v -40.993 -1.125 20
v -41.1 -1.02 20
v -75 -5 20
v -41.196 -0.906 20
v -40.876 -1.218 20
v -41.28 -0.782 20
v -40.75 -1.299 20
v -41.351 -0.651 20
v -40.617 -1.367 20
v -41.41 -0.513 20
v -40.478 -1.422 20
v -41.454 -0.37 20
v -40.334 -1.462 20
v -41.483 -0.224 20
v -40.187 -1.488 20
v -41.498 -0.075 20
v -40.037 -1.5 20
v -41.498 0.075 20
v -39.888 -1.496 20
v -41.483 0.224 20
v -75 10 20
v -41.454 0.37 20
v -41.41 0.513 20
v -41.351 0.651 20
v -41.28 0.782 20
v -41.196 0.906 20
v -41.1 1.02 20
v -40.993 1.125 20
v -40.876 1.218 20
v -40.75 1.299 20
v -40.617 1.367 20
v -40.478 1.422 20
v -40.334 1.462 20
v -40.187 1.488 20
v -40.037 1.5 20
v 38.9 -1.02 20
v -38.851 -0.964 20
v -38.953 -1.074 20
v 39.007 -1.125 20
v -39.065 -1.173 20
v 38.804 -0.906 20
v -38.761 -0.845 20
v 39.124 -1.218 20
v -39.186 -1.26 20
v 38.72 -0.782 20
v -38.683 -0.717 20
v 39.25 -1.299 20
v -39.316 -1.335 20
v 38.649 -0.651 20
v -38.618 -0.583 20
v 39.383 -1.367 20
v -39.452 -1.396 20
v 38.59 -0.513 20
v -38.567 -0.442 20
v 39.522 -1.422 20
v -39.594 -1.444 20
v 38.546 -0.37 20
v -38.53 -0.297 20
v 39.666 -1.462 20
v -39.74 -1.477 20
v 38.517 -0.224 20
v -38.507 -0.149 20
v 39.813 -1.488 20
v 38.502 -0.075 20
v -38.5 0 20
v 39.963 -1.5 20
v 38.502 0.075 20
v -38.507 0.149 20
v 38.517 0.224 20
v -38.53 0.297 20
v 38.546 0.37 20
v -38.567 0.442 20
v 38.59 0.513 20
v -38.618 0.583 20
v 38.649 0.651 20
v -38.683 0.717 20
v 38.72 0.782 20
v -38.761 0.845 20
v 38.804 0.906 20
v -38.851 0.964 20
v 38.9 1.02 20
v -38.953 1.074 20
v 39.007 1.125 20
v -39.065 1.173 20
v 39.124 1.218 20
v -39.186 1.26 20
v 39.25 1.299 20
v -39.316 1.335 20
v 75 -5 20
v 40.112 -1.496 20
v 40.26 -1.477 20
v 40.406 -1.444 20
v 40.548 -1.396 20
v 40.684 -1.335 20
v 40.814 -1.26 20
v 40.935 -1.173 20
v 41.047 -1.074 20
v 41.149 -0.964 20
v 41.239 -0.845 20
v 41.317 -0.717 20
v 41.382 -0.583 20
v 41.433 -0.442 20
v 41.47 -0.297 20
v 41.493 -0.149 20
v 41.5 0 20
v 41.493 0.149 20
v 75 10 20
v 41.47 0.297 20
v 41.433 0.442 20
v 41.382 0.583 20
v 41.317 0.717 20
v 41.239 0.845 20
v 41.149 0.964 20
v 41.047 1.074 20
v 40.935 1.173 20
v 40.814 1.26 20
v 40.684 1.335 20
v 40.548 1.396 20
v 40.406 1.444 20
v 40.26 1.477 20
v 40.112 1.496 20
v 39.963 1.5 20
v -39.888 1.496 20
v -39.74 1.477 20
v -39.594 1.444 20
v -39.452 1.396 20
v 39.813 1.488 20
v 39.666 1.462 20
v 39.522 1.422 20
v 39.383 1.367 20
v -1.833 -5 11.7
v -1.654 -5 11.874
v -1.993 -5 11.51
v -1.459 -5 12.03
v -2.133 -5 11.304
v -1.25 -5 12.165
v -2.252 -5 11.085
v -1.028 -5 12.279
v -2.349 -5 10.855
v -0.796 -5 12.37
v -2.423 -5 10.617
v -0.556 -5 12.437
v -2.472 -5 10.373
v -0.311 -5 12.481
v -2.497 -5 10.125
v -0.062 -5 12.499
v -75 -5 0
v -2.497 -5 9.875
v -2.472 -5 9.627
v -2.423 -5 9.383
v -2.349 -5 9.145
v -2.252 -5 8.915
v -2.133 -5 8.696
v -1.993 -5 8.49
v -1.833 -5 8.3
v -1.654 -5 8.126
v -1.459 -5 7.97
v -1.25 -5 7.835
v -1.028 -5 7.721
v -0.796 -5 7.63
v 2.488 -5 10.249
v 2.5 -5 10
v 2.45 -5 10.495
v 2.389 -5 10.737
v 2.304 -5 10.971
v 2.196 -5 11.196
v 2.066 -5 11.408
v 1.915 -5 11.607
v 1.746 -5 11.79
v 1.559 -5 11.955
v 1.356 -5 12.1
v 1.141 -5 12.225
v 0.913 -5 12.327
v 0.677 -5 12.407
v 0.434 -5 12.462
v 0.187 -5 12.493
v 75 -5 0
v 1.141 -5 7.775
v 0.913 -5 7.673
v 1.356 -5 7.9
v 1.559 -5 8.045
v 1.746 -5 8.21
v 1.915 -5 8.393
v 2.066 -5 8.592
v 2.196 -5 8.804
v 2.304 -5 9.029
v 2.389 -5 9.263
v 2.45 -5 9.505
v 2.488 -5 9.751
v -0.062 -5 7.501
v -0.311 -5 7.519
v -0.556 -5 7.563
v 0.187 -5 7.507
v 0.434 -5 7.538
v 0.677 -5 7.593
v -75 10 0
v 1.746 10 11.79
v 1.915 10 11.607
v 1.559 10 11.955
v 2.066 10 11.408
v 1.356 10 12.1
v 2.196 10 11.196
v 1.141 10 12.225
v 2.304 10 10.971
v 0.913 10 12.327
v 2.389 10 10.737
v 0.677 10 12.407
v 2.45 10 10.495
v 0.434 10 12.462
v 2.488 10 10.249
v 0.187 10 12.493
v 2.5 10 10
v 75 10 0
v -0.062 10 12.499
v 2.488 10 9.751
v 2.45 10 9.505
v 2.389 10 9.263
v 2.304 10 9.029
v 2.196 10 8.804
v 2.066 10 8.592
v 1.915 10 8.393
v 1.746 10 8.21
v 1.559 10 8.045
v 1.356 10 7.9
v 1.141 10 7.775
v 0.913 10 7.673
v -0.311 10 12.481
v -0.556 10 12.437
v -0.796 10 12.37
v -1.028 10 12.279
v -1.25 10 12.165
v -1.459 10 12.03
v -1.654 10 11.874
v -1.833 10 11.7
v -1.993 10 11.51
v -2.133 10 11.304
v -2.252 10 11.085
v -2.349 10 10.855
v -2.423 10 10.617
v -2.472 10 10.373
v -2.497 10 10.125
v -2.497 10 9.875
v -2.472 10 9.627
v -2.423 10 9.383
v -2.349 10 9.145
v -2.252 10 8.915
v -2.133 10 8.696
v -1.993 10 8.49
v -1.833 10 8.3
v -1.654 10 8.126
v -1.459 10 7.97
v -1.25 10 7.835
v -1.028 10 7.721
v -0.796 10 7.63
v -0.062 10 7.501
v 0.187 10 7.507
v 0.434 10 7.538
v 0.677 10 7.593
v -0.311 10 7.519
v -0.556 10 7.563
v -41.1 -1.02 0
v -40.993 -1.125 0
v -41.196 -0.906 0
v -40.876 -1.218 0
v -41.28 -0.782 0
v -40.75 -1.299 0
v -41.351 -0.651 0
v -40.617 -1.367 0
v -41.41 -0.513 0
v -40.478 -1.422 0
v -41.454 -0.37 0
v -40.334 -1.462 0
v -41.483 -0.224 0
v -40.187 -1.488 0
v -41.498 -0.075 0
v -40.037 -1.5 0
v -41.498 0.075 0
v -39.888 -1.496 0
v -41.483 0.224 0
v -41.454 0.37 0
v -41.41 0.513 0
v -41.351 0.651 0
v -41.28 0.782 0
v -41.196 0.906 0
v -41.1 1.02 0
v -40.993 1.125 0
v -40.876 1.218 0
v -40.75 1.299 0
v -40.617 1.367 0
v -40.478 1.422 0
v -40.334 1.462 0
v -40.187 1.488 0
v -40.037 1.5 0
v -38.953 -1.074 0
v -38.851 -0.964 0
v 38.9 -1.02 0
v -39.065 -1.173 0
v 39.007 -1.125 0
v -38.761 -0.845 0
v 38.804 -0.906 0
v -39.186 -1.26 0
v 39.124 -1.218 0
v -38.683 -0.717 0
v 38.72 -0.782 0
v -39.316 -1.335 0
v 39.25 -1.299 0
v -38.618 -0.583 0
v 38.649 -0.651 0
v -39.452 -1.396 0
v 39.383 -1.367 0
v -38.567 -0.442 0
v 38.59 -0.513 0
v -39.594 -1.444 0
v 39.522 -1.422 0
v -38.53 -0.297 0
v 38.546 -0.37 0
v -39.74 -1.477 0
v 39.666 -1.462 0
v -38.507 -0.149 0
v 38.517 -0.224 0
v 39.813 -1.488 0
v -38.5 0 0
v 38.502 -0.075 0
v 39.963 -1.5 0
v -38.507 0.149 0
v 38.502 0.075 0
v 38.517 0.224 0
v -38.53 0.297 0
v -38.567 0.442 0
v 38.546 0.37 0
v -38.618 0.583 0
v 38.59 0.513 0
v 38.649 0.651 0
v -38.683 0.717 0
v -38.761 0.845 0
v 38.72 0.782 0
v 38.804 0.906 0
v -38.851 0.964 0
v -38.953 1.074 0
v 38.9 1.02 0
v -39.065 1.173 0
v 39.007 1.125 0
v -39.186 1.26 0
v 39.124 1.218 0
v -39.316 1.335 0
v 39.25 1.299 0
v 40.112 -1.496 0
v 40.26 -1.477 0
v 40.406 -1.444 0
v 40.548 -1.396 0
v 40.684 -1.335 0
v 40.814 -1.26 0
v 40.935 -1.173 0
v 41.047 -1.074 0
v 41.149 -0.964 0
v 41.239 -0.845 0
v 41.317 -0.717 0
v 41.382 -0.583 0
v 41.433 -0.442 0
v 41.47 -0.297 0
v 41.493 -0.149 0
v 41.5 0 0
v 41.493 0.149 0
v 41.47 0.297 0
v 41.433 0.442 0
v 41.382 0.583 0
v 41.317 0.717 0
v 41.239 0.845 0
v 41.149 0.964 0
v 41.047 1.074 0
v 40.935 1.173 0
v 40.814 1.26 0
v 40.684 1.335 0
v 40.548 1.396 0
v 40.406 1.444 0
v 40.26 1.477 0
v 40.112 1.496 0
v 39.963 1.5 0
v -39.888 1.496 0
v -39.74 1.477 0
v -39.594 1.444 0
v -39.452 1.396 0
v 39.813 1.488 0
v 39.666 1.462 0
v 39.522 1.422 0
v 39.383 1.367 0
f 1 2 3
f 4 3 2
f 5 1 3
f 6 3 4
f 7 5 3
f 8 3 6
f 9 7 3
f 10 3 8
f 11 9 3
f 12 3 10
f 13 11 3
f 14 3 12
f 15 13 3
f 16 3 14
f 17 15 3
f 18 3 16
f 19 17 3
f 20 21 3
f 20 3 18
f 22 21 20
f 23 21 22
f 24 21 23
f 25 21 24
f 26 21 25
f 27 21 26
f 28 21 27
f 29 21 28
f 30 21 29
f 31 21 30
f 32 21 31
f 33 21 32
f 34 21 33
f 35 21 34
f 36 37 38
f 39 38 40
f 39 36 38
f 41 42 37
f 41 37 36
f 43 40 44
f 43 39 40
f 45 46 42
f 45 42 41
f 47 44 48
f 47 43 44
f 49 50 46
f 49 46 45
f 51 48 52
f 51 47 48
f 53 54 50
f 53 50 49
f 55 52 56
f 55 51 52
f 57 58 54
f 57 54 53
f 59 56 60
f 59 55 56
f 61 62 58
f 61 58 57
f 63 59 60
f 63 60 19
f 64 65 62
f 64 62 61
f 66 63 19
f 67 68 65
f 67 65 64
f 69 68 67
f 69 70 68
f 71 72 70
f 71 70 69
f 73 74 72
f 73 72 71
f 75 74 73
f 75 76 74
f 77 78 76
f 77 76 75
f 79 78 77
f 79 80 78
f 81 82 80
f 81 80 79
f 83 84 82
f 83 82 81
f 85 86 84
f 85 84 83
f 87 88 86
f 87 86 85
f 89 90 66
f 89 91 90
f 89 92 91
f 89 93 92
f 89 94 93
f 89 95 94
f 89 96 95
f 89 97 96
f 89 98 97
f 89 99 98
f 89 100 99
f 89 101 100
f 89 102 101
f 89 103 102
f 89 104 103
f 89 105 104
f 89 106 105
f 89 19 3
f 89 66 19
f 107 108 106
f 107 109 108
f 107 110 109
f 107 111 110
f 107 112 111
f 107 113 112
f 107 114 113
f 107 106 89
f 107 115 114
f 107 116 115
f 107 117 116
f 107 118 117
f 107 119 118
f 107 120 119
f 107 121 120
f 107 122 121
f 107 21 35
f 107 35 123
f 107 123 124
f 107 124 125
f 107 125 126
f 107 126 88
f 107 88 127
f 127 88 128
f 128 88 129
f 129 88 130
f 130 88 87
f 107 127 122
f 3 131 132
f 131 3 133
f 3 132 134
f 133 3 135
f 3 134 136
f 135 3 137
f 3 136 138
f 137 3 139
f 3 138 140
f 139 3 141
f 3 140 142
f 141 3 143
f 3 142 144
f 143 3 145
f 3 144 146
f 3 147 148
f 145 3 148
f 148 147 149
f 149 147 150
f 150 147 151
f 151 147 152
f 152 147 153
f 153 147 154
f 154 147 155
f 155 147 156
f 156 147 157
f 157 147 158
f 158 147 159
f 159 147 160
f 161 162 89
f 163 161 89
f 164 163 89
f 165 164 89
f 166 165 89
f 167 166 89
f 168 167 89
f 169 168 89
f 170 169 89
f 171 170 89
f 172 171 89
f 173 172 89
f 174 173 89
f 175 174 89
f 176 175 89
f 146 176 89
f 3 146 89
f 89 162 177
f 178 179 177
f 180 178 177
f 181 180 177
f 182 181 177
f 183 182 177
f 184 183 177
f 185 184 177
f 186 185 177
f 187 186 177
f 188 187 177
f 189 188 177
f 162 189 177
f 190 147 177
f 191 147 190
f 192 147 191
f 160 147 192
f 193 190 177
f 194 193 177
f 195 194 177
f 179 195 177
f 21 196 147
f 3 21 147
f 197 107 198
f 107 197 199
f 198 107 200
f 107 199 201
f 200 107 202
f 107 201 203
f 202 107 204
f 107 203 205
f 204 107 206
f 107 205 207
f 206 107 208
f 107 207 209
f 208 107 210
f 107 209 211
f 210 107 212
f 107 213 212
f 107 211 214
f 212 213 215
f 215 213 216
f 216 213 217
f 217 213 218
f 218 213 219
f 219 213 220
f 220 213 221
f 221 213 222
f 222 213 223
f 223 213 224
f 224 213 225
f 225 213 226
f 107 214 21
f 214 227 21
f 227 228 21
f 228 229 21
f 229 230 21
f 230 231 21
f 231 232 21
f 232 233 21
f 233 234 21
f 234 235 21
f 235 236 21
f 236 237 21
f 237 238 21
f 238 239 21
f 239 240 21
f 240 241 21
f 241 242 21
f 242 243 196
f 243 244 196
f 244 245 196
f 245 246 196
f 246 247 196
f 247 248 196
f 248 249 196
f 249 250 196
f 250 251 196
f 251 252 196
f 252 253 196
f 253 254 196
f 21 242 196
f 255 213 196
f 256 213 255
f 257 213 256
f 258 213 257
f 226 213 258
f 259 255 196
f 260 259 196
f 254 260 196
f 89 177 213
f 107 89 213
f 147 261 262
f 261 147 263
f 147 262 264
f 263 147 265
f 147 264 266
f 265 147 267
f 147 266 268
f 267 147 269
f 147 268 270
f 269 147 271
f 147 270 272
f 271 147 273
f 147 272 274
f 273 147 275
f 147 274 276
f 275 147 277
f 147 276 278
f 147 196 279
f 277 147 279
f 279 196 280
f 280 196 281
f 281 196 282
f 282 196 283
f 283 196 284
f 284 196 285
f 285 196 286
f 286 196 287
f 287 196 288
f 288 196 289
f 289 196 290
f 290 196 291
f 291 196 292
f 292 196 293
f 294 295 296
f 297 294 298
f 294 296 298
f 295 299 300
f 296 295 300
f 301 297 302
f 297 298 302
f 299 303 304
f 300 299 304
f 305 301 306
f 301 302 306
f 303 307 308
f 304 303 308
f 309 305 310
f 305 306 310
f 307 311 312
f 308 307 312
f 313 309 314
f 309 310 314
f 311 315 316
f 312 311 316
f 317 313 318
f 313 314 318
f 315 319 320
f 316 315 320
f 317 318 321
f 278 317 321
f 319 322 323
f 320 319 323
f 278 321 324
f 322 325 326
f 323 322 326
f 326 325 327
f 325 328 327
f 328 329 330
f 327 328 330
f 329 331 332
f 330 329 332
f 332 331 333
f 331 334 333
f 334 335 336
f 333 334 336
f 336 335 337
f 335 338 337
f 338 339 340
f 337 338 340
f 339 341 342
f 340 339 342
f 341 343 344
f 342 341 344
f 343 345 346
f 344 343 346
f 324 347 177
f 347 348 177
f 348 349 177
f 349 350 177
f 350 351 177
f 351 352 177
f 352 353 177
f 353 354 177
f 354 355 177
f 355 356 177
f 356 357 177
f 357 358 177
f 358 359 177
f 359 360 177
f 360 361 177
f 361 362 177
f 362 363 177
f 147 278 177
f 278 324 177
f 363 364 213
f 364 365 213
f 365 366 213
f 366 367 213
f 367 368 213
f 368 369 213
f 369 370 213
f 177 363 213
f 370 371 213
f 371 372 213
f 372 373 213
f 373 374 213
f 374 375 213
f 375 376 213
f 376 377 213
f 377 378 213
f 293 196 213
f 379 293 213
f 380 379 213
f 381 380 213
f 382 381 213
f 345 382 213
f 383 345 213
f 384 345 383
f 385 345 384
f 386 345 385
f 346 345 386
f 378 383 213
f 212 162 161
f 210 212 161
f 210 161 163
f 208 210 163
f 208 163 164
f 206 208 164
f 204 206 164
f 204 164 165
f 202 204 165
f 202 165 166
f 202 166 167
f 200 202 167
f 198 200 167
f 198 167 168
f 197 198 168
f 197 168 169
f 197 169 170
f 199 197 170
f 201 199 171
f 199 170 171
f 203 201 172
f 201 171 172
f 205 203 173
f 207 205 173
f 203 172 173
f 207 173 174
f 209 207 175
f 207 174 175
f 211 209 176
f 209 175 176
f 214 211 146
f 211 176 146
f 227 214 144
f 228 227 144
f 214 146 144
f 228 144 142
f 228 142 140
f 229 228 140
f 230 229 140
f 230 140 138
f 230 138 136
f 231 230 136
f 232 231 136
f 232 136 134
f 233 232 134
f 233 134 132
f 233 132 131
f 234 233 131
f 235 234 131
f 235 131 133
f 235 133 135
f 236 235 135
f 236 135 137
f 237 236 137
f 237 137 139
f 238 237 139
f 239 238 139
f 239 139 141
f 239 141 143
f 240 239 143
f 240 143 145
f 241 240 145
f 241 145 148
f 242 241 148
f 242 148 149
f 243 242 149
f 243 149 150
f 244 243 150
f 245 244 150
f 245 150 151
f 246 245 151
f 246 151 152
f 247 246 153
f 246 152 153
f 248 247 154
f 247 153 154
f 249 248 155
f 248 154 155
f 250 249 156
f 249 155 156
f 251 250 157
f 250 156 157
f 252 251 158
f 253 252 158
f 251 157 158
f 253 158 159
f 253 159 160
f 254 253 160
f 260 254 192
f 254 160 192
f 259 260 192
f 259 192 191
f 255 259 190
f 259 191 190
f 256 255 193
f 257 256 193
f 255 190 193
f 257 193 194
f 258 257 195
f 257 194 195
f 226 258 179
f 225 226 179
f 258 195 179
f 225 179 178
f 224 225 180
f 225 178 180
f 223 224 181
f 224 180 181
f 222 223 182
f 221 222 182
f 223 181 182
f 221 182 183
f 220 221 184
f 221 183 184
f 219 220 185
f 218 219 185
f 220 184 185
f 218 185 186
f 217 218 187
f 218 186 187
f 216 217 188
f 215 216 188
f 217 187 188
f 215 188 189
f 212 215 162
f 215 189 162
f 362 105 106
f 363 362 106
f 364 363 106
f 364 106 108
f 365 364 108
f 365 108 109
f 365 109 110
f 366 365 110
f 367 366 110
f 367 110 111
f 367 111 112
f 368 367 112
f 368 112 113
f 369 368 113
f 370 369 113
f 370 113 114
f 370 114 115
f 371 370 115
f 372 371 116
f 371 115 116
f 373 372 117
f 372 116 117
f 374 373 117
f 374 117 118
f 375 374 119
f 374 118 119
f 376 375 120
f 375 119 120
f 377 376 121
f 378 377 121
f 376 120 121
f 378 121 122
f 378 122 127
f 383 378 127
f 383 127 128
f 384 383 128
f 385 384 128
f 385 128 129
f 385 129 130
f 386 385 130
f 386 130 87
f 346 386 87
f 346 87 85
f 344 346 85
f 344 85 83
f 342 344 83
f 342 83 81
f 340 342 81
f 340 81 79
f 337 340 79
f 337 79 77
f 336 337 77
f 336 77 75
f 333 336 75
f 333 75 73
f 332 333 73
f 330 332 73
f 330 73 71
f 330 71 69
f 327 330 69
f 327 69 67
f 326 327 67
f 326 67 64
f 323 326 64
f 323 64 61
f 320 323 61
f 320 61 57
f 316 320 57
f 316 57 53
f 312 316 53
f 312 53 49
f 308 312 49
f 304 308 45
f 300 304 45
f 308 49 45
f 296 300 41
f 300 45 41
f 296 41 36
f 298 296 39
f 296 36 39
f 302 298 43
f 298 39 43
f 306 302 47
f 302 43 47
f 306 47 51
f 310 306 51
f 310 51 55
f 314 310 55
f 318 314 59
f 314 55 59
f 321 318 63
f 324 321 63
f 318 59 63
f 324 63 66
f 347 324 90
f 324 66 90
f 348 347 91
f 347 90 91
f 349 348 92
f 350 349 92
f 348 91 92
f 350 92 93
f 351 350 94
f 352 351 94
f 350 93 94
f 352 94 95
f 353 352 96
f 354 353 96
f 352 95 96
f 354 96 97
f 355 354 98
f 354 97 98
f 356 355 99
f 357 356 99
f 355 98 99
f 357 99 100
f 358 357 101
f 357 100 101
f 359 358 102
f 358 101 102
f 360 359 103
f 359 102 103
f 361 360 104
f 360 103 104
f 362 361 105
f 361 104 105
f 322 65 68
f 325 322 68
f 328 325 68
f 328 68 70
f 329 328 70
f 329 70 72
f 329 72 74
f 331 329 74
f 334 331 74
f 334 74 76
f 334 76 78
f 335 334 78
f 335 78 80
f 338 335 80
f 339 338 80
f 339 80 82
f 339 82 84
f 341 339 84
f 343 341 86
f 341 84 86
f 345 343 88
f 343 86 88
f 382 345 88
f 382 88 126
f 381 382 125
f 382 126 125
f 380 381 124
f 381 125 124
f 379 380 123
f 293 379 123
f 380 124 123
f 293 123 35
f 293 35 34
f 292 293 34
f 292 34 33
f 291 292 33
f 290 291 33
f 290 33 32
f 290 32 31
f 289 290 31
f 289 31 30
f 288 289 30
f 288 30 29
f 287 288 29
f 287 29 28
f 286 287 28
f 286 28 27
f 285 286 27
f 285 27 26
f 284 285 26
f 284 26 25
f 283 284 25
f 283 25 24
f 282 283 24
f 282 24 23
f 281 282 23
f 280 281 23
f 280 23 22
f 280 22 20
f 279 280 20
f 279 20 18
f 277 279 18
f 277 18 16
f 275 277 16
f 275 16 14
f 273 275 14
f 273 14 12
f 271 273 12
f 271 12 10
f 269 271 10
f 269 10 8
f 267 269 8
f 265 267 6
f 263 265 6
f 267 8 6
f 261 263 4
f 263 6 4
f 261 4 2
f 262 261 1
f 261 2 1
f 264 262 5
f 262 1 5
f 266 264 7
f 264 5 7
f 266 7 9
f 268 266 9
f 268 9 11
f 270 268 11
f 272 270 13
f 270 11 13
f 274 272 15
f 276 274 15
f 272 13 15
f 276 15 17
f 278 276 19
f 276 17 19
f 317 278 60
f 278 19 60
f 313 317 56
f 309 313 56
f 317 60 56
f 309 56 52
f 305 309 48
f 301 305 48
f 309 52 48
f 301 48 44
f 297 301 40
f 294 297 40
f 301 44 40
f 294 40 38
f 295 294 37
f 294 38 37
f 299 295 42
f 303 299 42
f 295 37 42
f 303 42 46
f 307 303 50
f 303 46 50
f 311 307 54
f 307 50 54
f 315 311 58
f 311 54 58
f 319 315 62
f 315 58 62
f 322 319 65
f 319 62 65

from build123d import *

# Parameters (mm, degrees)
F1_DEPTH = 20
F2_R     = 1.5
F3_DEPTH = 25
F4_R     = 2.5
F5_DEPTH = 25
F6_DEPTH = 5


with BuildPart() as f1:
    # F0 (on Top) → F1 (new body)
    with BuildSketch(Plane.XY):
        Polygon((75, -10), (75, 0), (75, 10), (-75, 10), (-75, -10), align=None)
    extrude(amount=F1_DEPTH)

    # F2 (on face) → F3 (cut)
    with BuildSketch(Plane.XY.offset(20)):
        with Locations((-40, 0)):
            Circle(F2_R)
        with Locations((40, 0)):
            Circle(F2_R)
    extrude(amount=-F3_DEPTH, mode=Mode.SUBTRACT)

    # F4 (on face) → F5 (cut)
    with BuildSketch(Plane.XZ.offset(10)):
        with Locations((0, 10)):
            Circle(F4_R)
    extrude(amount=-F5_DEPTH, mode=Mode.SUBTRACT)

    # F6 (cut): a face of the model
    f6_faces = [f1.faces().sort_by_distance(p)[0] for p in [
        (-73.486725405, -10, 10),
    ]]
    extrude(f6_faces, amount=-F6_DEPTH, mode=Mode.SUBTRACT)


solid = f1.part
